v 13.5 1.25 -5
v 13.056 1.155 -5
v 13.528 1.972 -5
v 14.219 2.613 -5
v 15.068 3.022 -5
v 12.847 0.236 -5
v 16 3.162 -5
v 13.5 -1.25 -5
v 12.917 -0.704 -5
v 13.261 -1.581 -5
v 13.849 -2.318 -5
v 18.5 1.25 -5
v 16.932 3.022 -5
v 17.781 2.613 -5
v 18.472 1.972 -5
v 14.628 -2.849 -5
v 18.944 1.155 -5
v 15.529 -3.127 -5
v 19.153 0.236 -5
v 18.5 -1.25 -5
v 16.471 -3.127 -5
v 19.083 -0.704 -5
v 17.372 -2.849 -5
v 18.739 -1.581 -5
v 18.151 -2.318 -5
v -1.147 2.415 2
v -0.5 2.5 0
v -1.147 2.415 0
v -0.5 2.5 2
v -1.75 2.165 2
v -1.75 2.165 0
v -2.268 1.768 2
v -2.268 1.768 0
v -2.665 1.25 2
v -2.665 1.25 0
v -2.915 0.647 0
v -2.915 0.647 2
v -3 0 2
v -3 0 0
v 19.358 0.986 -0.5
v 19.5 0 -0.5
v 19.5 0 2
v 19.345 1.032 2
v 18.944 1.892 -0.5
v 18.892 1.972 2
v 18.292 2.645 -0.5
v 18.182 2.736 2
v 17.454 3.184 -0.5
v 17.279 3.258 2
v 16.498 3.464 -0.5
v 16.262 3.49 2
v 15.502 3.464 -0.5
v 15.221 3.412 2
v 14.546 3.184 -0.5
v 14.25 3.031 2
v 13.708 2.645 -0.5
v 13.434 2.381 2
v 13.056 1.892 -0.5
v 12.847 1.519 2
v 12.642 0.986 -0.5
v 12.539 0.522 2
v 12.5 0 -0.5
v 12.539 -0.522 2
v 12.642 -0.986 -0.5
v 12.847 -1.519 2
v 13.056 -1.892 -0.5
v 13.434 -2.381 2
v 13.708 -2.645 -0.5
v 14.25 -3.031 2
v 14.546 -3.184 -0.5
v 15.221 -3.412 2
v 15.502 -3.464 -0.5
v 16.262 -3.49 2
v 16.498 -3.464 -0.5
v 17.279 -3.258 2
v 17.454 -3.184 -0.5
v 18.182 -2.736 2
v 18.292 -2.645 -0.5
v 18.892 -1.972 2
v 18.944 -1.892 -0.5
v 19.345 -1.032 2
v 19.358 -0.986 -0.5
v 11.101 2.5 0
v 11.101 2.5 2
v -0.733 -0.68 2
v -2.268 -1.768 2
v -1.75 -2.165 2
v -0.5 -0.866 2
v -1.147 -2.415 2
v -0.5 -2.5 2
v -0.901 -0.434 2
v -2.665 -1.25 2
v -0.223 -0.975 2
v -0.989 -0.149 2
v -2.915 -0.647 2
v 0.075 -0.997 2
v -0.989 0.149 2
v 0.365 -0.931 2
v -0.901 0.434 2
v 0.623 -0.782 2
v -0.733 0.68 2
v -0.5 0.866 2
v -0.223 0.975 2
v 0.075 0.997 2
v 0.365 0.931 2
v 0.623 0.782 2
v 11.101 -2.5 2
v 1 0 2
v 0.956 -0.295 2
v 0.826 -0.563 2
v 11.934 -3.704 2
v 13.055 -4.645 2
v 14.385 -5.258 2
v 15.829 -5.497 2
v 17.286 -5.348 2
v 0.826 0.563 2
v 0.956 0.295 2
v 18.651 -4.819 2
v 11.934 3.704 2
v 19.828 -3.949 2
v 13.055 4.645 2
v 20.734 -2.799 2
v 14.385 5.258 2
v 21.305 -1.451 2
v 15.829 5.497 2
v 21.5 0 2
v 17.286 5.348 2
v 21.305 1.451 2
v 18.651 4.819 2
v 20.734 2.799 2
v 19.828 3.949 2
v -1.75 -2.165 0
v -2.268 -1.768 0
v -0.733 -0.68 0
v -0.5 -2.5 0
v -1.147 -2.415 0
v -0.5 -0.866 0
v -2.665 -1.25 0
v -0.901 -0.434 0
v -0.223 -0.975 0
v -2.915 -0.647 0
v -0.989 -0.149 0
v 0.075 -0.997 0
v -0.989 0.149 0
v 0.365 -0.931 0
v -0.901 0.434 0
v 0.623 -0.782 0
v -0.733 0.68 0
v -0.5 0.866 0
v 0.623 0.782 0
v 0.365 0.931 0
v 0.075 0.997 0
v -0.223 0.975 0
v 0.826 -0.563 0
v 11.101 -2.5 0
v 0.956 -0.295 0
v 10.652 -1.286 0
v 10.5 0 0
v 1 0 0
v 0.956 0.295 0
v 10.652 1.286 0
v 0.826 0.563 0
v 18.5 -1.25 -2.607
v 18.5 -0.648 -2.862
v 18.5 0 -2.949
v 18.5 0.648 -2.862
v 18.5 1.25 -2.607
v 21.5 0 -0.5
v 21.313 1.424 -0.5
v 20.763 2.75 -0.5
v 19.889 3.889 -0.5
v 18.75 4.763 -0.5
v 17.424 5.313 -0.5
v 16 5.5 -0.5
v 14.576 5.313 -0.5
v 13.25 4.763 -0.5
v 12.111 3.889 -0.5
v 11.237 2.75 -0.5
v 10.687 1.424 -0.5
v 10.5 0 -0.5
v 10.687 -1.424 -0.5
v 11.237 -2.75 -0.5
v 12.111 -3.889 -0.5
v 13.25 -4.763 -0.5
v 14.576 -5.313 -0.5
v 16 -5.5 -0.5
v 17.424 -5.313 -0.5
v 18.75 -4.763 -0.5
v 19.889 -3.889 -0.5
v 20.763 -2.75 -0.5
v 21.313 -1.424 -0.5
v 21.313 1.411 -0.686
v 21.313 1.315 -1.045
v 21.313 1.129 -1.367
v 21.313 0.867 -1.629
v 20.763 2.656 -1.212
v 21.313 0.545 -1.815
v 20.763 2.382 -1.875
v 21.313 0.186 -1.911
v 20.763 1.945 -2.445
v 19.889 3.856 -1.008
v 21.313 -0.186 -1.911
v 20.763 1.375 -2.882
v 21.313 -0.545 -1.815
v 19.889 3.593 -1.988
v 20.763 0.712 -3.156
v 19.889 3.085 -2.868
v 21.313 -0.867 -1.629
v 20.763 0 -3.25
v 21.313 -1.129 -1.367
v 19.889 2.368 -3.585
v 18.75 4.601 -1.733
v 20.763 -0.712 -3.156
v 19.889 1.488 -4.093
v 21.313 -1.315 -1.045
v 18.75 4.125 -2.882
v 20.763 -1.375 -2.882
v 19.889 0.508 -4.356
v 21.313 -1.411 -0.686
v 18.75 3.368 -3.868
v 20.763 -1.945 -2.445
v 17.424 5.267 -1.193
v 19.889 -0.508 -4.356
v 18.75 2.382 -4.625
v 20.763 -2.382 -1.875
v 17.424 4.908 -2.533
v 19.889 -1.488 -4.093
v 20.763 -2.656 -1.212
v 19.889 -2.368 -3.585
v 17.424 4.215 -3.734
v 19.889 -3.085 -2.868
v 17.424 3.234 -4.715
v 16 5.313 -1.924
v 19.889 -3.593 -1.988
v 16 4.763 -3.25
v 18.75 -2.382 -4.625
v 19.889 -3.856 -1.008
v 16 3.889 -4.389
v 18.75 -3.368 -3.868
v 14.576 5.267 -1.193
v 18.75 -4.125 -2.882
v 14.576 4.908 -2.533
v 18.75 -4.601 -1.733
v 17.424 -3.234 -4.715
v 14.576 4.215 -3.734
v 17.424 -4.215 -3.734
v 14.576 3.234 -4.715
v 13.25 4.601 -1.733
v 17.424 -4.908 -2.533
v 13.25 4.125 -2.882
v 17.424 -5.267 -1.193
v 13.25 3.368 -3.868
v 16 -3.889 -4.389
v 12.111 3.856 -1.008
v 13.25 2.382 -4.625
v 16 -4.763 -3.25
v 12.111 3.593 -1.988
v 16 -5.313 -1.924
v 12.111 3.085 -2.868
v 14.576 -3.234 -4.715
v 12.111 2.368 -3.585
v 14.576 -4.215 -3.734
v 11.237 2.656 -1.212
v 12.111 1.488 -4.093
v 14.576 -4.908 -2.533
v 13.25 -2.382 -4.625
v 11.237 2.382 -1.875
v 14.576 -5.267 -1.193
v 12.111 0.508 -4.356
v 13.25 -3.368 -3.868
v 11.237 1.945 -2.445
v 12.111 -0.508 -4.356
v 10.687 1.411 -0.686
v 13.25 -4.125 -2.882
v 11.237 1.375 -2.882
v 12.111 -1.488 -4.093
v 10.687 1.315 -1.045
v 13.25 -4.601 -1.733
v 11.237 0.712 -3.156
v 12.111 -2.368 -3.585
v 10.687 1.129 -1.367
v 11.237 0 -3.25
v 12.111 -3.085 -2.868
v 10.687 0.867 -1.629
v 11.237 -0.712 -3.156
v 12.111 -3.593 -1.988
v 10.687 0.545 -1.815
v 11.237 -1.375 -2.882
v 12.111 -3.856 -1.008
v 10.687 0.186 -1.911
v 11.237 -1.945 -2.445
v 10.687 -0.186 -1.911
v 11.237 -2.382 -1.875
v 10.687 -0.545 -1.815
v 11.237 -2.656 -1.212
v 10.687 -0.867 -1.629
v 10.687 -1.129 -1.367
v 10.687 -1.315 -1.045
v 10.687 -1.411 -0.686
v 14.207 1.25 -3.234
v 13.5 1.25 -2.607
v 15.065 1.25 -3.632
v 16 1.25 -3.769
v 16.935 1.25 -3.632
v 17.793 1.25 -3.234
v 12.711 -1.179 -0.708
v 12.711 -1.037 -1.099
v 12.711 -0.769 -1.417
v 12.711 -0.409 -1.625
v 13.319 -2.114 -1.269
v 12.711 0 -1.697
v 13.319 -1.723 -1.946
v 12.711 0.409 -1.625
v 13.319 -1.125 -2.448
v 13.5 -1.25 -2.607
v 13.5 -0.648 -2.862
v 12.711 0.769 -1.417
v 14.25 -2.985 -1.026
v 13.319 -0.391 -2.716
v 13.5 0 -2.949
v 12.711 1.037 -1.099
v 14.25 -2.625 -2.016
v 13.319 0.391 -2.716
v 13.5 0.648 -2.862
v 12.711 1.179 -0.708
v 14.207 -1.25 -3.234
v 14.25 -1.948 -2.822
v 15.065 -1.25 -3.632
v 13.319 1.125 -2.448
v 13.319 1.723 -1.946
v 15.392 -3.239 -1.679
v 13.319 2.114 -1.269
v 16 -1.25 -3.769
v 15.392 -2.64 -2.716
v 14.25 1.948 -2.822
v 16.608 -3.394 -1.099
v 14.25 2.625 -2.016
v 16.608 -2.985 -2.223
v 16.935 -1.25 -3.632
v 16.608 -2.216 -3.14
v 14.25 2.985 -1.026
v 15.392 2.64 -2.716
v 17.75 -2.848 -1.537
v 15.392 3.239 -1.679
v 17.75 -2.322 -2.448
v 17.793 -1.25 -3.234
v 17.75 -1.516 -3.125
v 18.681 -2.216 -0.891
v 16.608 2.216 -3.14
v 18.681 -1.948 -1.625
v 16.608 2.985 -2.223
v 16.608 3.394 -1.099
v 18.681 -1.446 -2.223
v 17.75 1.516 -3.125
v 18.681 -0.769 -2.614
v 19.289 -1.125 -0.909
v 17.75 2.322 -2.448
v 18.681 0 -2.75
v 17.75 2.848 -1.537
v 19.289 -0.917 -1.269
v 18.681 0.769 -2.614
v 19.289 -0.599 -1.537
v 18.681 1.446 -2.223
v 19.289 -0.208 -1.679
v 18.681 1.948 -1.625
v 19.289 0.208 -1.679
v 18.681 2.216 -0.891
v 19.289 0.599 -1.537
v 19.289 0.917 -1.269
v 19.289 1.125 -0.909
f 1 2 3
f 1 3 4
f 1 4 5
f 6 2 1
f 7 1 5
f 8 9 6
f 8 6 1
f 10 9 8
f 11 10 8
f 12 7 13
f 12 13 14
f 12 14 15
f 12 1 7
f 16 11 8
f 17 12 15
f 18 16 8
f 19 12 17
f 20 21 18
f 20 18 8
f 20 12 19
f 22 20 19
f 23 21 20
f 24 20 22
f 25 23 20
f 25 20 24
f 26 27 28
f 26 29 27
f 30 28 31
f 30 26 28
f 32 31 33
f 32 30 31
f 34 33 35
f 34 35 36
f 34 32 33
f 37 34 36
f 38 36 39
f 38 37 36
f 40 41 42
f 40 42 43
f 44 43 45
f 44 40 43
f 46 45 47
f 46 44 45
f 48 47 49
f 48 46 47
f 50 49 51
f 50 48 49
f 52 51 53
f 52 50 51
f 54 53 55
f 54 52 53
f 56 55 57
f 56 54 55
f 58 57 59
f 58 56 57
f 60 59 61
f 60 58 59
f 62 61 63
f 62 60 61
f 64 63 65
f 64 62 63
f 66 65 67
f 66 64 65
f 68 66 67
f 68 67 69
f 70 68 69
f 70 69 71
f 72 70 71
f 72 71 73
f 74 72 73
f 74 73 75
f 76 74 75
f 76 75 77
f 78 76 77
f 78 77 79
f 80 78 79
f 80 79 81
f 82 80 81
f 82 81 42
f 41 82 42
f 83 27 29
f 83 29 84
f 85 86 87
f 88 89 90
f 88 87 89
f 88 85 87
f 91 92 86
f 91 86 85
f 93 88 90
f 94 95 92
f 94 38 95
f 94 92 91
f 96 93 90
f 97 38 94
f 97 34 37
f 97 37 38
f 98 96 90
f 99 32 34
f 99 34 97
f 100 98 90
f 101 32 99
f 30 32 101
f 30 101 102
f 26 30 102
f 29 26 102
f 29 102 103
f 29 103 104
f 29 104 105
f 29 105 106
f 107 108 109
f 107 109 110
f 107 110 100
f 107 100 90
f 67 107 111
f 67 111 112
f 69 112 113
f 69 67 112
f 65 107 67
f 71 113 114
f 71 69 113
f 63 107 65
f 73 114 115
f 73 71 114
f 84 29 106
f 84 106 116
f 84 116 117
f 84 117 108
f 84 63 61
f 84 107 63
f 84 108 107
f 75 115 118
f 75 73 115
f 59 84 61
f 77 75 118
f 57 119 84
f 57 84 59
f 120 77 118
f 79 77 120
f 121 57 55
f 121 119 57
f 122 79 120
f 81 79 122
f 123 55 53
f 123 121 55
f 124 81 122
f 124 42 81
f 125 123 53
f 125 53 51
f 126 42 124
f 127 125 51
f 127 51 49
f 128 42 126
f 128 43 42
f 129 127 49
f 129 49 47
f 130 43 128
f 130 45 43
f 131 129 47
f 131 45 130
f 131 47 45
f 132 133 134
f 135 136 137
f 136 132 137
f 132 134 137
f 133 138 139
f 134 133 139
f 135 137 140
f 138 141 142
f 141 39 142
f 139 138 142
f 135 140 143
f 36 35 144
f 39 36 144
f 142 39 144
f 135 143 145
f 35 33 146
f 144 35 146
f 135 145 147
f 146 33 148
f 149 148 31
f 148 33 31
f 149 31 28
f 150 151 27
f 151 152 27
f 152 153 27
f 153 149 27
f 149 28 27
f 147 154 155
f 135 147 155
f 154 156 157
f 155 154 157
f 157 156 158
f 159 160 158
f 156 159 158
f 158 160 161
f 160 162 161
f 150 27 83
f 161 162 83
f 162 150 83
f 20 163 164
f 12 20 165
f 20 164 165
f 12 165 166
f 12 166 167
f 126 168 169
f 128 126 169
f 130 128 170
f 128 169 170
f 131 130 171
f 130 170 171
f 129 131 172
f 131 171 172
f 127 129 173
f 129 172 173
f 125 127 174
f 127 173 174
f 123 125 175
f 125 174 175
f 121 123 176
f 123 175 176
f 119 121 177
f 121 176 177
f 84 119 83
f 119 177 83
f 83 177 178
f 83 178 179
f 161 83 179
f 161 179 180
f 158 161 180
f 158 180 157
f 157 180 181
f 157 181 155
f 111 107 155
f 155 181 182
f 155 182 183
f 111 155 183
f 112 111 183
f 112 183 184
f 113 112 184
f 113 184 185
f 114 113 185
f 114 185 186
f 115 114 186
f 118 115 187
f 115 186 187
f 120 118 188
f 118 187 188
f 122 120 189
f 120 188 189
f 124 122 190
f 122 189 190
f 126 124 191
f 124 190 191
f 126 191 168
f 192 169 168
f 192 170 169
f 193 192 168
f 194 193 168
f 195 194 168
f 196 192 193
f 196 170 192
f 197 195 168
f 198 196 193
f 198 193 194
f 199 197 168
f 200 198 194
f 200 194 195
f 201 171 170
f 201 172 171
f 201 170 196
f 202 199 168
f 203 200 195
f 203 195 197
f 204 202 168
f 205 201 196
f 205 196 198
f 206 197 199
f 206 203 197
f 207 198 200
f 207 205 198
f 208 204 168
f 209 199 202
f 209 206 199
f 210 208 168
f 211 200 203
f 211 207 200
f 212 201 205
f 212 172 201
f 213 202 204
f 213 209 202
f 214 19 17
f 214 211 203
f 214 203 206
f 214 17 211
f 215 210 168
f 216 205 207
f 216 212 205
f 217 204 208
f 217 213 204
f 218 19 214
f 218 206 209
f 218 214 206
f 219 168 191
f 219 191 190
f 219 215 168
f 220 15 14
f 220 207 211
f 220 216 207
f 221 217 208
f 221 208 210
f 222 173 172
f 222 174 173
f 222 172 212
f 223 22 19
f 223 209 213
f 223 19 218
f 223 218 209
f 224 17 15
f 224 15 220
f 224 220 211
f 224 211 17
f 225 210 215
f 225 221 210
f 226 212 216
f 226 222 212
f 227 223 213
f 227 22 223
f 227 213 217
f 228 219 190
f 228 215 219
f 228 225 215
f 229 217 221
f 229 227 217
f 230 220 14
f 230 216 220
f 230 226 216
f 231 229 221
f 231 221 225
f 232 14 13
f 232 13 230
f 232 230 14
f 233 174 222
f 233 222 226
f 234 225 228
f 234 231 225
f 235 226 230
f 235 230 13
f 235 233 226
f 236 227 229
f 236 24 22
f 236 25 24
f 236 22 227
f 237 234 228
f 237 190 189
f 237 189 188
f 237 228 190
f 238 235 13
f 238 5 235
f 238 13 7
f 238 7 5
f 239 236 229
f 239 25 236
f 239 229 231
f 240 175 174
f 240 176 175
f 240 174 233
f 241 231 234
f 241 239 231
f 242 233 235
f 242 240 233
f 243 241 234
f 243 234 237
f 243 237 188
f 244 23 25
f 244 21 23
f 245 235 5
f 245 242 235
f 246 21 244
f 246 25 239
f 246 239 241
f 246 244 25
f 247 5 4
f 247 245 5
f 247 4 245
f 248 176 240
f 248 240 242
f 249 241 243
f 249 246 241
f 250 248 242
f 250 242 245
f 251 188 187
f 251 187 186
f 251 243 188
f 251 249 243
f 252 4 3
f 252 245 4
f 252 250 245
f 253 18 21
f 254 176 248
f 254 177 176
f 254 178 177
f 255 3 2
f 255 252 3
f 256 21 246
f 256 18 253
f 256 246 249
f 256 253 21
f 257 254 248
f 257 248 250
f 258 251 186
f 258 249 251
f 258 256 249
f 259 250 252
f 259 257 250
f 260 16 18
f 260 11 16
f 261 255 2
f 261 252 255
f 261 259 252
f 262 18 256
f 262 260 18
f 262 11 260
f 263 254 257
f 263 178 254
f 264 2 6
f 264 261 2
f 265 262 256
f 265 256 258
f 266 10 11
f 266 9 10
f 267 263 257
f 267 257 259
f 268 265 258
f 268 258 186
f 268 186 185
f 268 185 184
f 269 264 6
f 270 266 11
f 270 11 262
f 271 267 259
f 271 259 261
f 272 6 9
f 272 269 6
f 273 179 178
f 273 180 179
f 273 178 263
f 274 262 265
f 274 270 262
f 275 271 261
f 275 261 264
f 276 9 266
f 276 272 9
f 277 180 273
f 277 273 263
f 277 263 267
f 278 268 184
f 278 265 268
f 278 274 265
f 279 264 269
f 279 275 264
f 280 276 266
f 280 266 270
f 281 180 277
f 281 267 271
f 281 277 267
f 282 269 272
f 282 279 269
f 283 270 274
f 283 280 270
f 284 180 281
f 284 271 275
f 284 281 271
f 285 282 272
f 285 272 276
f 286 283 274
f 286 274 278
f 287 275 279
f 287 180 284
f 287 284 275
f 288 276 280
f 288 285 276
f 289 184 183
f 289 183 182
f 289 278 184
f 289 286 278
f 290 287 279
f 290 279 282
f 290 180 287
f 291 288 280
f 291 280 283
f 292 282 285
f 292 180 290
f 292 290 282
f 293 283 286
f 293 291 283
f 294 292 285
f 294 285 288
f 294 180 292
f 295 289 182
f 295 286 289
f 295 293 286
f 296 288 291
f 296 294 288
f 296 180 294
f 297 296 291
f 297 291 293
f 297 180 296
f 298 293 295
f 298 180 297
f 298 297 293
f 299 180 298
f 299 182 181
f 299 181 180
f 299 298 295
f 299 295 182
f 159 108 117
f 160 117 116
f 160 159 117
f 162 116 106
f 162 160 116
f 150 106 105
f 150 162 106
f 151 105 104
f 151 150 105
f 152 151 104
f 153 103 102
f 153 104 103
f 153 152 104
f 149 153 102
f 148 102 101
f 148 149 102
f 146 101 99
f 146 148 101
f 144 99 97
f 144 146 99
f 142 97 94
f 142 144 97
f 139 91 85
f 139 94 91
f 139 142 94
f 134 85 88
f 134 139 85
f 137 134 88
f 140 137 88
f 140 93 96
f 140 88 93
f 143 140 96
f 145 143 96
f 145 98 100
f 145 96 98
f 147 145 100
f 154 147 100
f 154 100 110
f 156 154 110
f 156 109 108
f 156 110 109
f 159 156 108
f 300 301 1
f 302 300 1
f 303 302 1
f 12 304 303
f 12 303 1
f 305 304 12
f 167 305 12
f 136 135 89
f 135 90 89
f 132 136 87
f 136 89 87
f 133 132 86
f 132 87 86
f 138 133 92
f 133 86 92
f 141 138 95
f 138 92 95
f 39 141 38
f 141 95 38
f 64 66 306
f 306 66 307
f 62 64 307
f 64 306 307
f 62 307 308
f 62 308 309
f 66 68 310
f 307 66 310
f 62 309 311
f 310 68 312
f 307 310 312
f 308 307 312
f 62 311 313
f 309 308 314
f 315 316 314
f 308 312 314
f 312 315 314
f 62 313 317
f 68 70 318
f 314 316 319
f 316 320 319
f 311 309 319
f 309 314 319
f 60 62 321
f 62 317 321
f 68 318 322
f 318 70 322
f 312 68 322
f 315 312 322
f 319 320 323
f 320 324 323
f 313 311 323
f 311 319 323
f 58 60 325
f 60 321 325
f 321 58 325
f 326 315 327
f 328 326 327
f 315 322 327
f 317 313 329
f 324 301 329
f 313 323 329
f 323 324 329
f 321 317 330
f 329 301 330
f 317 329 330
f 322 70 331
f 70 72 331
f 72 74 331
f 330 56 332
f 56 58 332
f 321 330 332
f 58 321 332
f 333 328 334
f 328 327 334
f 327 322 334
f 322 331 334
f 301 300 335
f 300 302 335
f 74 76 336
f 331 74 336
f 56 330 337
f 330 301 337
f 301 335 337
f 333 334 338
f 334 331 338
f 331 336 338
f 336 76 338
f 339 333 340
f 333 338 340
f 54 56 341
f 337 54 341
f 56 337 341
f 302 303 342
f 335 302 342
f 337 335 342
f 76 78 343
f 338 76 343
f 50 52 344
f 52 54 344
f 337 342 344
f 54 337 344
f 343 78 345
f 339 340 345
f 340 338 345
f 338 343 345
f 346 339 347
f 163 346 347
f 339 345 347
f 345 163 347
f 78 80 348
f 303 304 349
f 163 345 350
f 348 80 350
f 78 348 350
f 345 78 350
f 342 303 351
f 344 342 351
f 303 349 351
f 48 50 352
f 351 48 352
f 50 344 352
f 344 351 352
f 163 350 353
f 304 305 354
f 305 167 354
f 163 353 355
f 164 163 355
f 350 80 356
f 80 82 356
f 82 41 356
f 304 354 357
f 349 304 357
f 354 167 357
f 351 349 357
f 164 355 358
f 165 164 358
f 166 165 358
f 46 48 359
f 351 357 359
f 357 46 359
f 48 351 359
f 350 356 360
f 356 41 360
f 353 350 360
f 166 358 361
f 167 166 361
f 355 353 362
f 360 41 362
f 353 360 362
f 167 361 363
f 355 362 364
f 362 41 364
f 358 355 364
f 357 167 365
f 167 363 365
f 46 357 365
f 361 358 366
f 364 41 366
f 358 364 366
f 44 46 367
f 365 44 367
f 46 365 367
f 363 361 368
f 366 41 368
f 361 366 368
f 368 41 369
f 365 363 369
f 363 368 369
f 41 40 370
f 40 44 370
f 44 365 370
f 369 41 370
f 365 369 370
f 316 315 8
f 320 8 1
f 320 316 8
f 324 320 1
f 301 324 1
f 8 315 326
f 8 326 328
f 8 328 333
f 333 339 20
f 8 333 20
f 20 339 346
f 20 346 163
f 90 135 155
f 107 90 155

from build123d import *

# Parameters (mm, degrees)
F0_W      = 19
F0_H      = 5
F1_DEPTH  = 2
F4_ANGLE  = 180
F5_R      = 5.5
F6_DEPTH  = 2.5
F7_R      = 3.5
F8_DEPTH  = 2.5
F11_W     = 20
F11_H     = 5
F12_DEPTH = 12.5
F13_W     = 5
F13_H     = 2.5
F14_DEPTH = 25
F15_R     = 1
F16_DEPTH = 25
F17_R     = 2.49999


# Not quite as in the source:
# - a fillet or chamfer is up to 0.001 mm smaller than in the source, because OpenCascade refuses the exact size


with BuildPart() as f1:
    # F0 (on Top) → F1 (new body)
    with BuildSketch(Plane.XY):
        with Locations((6.5, 0)):
            Rectangle(F0_W, F0_H)
    extrude(amount=F1_DEPTH)



with BuildPart() as f4:
    # F3 (on offset) → F4 (revolve)
    with BuildSketch(Plane.XY.offset(-0.5)):
        with BuildLine():
            ThreePointArc((21.5, 0), (16, 5.5), (10.5, 0))
            Line((10.5, 0), (21.5, 0))
        make_face()
    revolve(axis=Axis((22.6478228122, 0, -0.5), (-1, 0, 0)), revolution_arc=F4_ANGLE)


with BuildPart() as f1_1:
    add(f1.part)

    add(f4.part)  # F6 merges F4
    # F5 (on offset) → F6 (join, through all)
    with BuildSketch(Plane.XY.offset(-0.5)):
        with Locations((16, 0)):
            Circle(F5_R)
    extrude(amount=F6_DEPTH)

    # F7 (on offset) → F8 (cut, through all)
    with BuildSketch(Plane.XY.offset(-0.5)):
        with Locations((16, 0)):
            Circle(F7_R)
    extrude(amount=F8_DEPTH, mode=Mode.SUBTRACT)

    # F9 (on offset) → F10 (revolve, cut)
    with BuildSketch(Plane.XY.offset(-0.5)):
        with BuildLine():
            ThreePointArc((12.5, 0), (16, -3.5), (19.5, 0))
            Line((19.5, 0), (12.5, 0))
        make_face()
    revolve(axis=Axis((18.6947258189, 0, -0.5), (1, 0, 0)), mode=Mode.SUBTRACT)

    # F11 (on Front) → F12 (cut, symmetric)
    with BuildSketch(Plane.XZ):
        with Locations((16, -7.5)):
            Rectangle(F11_W, F11_H)
    extrude(amount=F12_DEPTH, both=True, mode=Mode.SUBTRACT)

    # F13 (on Top) → F14 (cut)
    with BuildSketch(Plane.XY):
        with Locations((16, 0)):
            Rectangle(F13_W, F13_H)
    extrude(amount=-F14_DEPTH, mode=Mode.SUBTRACT)

    # F15 (on Top) → F16 (cut)
    with BuildSketch(Plane.XY):
        Circle(F15_R)
    extrude(amount=F16_DEPTH, mode=Mode.SUBTRACT)

    # F17 (radius 2.5 in the source; OpenCascade refuses exactly that, so slightly less here)
    f17_edges = [f1_1.edges().sort_by_distance(p)[0] for p in [
        (-3, -2.5, 1),
        (-3, 2.5, 1),
    ]]
    fillet(f17_edges, radius=F17_R)


solid = f1_1.part
